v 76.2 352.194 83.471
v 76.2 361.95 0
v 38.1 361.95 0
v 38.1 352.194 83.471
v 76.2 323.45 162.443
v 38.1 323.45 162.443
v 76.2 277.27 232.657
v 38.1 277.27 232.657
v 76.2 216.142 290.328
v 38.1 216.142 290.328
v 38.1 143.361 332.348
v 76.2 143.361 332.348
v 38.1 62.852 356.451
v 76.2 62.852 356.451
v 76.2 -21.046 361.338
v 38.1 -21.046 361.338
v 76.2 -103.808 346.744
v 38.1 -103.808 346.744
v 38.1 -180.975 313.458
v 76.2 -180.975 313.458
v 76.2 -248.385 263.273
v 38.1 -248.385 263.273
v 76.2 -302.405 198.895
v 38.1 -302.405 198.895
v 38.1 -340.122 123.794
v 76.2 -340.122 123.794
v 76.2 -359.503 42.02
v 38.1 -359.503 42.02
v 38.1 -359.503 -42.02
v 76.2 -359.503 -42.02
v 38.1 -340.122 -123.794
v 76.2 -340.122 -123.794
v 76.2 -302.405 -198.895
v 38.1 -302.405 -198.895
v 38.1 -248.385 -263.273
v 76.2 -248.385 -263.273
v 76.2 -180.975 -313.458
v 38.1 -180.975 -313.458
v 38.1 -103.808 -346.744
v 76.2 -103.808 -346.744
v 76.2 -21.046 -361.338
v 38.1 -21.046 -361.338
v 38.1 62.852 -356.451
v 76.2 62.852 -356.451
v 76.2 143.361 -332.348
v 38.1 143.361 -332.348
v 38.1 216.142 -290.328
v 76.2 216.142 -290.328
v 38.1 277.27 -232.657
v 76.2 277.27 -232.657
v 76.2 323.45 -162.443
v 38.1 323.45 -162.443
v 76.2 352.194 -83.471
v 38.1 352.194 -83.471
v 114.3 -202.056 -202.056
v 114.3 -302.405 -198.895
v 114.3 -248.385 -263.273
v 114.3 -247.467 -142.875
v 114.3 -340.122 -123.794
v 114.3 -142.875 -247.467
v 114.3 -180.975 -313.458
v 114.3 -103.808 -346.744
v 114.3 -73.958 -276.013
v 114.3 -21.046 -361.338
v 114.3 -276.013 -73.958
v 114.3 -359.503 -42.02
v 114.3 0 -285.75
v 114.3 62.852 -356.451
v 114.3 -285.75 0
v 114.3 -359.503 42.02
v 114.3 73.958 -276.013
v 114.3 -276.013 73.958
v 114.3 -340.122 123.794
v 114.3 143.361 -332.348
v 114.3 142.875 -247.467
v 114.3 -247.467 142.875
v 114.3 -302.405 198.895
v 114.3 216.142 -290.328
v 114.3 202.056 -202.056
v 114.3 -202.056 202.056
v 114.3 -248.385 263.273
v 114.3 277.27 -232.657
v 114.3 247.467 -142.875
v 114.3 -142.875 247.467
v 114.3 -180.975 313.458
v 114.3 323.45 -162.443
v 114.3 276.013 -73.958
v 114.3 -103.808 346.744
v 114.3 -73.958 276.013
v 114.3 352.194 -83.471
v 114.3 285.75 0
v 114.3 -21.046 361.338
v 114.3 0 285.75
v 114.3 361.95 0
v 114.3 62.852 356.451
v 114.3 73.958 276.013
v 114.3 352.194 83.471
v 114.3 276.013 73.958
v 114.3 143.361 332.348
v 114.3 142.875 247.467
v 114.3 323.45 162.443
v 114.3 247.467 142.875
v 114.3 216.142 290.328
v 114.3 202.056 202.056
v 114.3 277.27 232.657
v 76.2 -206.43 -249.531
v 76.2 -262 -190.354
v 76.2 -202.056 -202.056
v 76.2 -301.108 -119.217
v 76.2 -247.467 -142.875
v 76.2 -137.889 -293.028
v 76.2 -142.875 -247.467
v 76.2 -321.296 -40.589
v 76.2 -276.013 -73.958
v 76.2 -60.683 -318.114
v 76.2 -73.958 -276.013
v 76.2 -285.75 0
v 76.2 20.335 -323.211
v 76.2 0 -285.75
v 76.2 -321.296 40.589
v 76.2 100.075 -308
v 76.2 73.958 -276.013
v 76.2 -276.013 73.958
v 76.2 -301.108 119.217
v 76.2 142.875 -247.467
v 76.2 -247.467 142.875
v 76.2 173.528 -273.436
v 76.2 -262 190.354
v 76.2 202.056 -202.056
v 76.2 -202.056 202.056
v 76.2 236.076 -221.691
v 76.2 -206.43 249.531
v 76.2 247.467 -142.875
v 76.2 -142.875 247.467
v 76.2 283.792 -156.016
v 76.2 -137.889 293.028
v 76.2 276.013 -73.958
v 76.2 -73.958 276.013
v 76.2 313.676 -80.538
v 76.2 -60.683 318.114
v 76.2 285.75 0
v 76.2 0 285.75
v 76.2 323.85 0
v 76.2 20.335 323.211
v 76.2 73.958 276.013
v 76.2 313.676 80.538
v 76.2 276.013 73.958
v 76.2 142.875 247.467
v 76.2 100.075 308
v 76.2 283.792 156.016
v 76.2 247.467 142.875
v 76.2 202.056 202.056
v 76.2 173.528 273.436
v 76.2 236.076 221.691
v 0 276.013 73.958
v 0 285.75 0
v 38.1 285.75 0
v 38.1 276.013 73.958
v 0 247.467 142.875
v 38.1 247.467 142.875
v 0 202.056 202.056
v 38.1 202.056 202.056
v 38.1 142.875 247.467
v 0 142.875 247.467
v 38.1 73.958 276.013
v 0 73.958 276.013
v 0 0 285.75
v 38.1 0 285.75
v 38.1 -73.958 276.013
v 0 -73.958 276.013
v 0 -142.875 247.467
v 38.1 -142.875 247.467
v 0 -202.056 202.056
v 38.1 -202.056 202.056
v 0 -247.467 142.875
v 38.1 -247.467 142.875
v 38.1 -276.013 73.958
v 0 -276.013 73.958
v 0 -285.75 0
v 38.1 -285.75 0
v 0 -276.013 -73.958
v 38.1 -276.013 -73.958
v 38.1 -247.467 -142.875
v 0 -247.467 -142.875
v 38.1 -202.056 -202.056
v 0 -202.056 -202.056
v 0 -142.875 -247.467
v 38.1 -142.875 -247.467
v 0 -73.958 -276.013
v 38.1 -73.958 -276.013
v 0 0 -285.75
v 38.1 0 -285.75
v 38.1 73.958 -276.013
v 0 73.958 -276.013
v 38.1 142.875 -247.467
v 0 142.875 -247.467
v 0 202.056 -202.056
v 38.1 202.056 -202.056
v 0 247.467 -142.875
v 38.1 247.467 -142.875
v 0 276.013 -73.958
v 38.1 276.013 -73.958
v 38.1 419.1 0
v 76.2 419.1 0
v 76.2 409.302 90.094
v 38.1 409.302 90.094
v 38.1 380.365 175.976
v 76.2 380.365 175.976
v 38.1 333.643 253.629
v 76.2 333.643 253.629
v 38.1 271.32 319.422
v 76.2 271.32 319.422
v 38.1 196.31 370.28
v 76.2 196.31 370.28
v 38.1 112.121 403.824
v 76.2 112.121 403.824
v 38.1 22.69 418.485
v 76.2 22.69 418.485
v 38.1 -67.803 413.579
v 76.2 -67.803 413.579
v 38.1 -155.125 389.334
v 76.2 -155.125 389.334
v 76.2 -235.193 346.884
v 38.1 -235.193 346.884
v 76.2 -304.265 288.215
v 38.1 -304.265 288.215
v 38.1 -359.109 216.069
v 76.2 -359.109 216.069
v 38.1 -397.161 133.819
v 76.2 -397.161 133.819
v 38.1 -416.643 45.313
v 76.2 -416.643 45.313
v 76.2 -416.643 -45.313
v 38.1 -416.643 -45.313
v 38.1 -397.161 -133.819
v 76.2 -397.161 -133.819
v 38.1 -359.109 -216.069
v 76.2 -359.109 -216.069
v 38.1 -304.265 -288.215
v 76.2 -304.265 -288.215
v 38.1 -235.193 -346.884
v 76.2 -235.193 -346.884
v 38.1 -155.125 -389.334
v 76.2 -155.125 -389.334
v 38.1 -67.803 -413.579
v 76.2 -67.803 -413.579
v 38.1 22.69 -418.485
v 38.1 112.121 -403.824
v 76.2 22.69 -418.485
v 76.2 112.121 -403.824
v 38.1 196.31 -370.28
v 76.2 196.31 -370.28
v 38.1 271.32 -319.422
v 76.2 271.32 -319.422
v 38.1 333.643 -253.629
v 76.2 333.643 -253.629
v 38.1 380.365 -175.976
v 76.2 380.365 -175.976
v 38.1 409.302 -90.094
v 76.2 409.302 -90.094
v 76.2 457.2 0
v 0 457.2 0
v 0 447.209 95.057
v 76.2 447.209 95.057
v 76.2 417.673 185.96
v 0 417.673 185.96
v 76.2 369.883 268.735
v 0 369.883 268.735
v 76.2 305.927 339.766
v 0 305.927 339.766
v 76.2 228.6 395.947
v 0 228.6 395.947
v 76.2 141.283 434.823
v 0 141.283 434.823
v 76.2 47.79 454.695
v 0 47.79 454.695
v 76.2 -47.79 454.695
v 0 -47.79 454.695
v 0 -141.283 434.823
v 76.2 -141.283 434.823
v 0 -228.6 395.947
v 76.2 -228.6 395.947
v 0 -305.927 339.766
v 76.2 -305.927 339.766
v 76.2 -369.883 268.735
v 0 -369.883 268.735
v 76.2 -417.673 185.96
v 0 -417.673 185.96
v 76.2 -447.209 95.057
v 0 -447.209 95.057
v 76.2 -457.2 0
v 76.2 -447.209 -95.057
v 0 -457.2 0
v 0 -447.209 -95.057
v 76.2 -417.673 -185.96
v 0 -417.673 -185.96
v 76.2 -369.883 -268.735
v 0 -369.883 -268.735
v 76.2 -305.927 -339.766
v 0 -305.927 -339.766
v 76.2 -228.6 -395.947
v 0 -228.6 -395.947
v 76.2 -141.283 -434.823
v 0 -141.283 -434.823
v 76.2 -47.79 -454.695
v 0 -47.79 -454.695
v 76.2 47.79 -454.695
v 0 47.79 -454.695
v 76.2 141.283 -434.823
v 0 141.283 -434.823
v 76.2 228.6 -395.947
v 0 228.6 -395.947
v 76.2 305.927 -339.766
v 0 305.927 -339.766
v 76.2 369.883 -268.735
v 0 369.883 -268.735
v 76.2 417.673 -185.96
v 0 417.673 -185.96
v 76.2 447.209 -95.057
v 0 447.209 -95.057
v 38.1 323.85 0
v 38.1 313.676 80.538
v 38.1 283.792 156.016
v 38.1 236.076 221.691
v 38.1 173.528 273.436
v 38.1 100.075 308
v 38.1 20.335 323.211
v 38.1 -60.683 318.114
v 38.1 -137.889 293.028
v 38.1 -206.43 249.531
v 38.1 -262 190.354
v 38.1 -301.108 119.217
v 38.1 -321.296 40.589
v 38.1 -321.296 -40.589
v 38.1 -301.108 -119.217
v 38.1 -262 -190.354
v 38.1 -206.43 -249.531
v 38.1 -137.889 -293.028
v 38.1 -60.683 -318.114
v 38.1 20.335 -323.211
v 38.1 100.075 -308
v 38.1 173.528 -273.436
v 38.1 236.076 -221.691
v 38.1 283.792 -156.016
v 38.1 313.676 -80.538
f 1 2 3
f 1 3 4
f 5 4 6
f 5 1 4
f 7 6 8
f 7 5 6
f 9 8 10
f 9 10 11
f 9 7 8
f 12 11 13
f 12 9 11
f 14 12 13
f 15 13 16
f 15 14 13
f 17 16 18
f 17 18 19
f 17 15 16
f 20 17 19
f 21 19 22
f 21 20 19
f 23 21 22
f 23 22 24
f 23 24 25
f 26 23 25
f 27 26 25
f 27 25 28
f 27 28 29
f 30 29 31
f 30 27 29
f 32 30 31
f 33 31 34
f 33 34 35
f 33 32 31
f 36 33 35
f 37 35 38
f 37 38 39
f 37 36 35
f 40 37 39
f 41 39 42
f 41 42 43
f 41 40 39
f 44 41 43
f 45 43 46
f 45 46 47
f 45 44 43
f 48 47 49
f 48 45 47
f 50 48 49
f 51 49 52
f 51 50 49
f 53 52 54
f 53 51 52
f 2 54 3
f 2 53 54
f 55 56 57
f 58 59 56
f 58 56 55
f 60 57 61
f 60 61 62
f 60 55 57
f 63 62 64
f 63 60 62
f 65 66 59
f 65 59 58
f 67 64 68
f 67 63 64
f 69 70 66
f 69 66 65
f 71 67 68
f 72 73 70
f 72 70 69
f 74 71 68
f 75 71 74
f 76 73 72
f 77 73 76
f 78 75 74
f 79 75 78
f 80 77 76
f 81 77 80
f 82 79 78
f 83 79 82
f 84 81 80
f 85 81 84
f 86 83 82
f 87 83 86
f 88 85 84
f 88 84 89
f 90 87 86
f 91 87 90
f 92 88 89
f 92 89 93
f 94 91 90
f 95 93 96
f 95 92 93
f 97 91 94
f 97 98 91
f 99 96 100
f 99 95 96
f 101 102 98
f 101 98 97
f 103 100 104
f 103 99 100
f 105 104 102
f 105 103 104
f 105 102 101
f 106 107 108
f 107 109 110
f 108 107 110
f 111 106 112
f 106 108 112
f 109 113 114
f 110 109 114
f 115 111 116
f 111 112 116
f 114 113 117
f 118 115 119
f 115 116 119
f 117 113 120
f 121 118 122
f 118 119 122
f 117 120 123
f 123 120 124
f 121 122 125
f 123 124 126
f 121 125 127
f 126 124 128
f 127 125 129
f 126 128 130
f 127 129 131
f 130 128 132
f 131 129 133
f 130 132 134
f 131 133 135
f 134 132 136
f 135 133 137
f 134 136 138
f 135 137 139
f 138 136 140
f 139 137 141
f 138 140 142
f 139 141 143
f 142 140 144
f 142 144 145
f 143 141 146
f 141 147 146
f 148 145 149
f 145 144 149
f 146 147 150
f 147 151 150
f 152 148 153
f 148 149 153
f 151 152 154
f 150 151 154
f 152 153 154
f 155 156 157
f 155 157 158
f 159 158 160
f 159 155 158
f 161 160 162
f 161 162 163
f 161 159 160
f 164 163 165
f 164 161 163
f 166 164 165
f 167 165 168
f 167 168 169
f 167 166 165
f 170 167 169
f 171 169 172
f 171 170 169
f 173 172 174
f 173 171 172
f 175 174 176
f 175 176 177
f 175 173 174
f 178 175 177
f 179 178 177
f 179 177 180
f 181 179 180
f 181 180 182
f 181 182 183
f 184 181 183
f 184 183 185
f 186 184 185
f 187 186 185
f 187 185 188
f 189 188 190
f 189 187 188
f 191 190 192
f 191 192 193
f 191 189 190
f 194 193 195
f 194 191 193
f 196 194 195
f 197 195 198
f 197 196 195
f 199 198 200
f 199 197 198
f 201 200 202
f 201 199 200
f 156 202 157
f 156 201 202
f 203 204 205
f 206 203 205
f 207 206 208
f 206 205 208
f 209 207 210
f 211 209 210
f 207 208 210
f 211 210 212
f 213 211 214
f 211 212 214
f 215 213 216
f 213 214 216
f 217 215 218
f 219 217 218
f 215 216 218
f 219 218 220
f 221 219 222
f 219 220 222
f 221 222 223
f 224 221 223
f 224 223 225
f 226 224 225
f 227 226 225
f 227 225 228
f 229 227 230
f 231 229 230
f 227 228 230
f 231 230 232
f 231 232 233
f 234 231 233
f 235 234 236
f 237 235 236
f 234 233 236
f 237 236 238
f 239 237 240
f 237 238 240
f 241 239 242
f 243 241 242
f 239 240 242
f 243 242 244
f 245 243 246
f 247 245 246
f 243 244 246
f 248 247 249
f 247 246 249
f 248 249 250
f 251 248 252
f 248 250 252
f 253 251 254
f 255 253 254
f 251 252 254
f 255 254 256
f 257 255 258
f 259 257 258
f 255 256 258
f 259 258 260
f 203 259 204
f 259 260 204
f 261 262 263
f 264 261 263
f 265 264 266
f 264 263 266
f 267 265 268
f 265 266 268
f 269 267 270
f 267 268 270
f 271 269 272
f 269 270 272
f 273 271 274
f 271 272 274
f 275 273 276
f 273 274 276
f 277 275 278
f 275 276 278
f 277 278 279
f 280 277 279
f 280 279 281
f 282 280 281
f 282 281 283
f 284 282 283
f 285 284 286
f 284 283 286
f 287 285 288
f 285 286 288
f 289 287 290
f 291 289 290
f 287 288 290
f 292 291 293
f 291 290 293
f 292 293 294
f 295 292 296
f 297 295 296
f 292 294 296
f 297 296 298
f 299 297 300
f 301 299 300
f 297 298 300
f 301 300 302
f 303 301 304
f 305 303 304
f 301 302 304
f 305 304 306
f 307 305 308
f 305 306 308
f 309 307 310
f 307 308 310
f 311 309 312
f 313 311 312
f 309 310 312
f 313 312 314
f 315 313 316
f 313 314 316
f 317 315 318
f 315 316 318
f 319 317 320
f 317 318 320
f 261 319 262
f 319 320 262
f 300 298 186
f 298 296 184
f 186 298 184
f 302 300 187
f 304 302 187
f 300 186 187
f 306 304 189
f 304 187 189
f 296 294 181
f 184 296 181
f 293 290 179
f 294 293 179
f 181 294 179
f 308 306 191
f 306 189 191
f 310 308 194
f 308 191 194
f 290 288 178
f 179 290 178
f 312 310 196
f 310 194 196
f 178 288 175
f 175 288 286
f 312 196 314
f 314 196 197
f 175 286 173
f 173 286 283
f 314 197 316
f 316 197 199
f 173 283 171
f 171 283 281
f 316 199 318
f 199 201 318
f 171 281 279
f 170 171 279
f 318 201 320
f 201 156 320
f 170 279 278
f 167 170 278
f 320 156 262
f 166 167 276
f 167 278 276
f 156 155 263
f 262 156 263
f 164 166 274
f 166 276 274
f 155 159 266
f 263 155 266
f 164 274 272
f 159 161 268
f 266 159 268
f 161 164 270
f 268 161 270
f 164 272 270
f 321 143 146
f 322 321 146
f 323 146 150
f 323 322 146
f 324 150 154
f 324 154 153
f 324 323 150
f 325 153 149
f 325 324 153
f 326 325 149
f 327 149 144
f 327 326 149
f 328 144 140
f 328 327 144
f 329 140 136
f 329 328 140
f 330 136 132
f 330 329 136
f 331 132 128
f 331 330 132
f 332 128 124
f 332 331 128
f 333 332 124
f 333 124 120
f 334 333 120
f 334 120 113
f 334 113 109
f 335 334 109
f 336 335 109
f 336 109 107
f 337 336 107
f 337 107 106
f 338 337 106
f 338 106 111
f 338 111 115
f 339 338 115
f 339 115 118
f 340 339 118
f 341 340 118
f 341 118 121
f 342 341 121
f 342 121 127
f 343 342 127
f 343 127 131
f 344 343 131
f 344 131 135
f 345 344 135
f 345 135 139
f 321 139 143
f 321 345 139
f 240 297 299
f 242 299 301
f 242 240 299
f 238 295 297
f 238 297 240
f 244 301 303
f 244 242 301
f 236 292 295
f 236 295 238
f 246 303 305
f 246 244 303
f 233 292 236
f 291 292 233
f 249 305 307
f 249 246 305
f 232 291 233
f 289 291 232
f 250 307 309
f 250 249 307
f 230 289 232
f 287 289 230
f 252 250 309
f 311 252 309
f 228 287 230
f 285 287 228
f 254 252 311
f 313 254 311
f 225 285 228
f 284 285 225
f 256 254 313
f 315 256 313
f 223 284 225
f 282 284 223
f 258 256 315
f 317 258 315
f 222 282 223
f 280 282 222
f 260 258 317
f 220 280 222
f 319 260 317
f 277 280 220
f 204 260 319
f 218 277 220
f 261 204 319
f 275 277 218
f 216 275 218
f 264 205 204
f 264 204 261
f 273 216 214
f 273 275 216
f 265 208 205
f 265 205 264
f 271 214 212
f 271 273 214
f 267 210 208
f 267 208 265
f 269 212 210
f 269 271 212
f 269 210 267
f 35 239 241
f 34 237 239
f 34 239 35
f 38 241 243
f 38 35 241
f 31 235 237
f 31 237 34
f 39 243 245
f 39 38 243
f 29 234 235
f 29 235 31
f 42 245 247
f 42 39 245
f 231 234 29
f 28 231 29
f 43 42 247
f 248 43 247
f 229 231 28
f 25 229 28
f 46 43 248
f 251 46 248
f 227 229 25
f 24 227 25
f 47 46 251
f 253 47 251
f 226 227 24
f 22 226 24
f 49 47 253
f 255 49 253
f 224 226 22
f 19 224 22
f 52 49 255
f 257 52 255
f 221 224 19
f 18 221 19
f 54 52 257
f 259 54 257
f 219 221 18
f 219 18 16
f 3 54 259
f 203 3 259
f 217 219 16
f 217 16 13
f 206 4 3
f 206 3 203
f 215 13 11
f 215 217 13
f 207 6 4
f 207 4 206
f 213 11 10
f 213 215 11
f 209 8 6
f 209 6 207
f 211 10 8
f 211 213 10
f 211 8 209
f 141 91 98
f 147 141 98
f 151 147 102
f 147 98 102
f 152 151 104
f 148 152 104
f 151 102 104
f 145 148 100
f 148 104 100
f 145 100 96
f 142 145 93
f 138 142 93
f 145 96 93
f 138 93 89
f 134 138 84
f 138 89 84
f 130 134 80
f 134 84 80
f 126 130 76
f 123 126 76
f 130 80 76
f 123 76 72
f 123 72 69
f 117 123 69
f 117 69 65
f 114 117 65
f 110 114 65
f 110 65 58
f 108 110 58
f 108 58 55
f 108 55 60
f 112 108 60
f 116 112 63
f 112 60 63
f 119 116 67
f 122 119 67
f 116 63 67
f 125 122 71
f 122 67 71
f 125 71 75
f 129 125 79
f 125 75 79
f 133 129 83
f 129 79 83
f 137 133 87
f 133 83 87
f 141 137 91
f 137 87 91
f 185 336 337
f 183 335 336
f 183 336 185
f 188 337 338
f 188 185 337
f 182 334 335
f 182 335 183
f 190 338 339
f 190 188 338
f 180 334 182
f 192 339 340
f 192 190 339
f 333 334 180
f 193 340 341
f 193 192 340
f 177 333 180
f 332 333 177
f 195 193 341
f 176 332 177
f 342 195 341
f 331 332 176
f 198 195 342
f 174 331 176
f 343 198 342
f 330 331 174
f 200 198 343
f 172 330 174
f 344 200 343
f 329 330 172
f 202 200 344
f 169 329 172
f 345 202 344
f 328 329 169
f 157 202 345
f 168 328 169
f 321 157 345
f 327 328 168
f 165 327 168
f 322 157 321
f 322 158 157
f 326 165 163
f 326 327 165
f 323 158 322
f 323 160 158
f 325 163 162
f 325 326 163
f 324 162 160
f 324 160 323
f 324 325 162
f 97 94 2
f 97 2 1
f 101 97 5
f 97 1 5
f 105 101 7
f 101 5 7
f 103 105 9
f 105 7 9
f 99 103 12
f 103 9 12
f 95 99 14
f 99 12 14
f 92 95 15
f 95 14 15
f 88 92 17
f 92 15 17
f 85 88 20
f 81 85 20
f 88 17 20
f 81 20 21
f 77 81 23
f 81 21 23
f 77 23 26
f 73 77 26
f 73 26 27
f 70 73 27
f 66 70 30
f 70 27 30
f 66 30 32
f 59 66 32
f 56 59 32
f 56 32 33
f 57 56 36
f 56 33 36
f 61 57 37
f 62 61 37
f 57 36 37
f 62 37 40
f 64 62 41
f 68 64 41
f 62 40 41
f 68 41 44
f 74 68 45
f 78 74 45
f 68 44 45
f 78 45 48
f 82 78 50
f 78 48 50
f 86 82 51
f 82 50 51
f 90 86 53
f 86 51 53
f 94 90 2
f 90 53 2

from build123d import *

# Parameters (mm, degrees)
F0_R     = 457.2
F0_R_2   = 419.1
F0_R_3   = 361.95
F0_R_4   = 323.85
F1_DEPTH = 76.2
F2_R     = 419.1
F2_R_2   = 361.95
F3_DEPTH = 38.1
F4_DEPTH = 38.1
F5_R     = 323.85
F5_R_2   = 285.75
F6_DEPTH = 38.1
F7_R     = 323.85
F7_R_2   = 285.75
F8_DEPTH = 38.1


with BuildPart() as f1:
    # F0 (on Right) → F1 (new body)
    with BuildSketch(Plane.YZ):
        Circle(F0_R)
        Circle(F0_R_2, mode=Mode.SUBTRACT)
        Circle(F0_R_2)
        Circle(F0_R_3, mode=Mode.SUBTRACT)
        Circle(F0_R_3)
        Circle(F0_R_4, mode=Mode.SUBTRACT)
    extrude(amount=F1_DEPTH)

    # F2 (on face) → F3 (cut)
    with BuildSketch(Plane.YZ.offset(76.2)):
        Circle(F2_R)
        Circle(F2_R_2, mode=Mode.SUBTRACT)
    extrude(amount=-F3_DEPTH, mode=Mode.SUBTRACT)

    # F4 (add): a face of the model
    f4_faces = [f1.faces().sort_by_distance(p)[0] for p in [
        (76.2, -351.712508022, 0),
    ]]
    extrude(f4_faces, amount=F4_DEPTH)

    # F5 (on Right) → F6 (join)
    with BuildSketch(Plane.YZ):
        Circle(F5_R)
        Circle(F5_R_2, mode=Mode.SUBTRACT)
    extrude(amount=F6_DEPTH)

    # F7 (on face) → F8 (join)
    with BuildSketch(Plane.YZ.offset(114.3)):
        Circle(F7_R)
        Circle(F7_R_2, mode=Mode.SUBTRACT)
    extrude(amount=-F8_DEPTH)


solid = f1.part
